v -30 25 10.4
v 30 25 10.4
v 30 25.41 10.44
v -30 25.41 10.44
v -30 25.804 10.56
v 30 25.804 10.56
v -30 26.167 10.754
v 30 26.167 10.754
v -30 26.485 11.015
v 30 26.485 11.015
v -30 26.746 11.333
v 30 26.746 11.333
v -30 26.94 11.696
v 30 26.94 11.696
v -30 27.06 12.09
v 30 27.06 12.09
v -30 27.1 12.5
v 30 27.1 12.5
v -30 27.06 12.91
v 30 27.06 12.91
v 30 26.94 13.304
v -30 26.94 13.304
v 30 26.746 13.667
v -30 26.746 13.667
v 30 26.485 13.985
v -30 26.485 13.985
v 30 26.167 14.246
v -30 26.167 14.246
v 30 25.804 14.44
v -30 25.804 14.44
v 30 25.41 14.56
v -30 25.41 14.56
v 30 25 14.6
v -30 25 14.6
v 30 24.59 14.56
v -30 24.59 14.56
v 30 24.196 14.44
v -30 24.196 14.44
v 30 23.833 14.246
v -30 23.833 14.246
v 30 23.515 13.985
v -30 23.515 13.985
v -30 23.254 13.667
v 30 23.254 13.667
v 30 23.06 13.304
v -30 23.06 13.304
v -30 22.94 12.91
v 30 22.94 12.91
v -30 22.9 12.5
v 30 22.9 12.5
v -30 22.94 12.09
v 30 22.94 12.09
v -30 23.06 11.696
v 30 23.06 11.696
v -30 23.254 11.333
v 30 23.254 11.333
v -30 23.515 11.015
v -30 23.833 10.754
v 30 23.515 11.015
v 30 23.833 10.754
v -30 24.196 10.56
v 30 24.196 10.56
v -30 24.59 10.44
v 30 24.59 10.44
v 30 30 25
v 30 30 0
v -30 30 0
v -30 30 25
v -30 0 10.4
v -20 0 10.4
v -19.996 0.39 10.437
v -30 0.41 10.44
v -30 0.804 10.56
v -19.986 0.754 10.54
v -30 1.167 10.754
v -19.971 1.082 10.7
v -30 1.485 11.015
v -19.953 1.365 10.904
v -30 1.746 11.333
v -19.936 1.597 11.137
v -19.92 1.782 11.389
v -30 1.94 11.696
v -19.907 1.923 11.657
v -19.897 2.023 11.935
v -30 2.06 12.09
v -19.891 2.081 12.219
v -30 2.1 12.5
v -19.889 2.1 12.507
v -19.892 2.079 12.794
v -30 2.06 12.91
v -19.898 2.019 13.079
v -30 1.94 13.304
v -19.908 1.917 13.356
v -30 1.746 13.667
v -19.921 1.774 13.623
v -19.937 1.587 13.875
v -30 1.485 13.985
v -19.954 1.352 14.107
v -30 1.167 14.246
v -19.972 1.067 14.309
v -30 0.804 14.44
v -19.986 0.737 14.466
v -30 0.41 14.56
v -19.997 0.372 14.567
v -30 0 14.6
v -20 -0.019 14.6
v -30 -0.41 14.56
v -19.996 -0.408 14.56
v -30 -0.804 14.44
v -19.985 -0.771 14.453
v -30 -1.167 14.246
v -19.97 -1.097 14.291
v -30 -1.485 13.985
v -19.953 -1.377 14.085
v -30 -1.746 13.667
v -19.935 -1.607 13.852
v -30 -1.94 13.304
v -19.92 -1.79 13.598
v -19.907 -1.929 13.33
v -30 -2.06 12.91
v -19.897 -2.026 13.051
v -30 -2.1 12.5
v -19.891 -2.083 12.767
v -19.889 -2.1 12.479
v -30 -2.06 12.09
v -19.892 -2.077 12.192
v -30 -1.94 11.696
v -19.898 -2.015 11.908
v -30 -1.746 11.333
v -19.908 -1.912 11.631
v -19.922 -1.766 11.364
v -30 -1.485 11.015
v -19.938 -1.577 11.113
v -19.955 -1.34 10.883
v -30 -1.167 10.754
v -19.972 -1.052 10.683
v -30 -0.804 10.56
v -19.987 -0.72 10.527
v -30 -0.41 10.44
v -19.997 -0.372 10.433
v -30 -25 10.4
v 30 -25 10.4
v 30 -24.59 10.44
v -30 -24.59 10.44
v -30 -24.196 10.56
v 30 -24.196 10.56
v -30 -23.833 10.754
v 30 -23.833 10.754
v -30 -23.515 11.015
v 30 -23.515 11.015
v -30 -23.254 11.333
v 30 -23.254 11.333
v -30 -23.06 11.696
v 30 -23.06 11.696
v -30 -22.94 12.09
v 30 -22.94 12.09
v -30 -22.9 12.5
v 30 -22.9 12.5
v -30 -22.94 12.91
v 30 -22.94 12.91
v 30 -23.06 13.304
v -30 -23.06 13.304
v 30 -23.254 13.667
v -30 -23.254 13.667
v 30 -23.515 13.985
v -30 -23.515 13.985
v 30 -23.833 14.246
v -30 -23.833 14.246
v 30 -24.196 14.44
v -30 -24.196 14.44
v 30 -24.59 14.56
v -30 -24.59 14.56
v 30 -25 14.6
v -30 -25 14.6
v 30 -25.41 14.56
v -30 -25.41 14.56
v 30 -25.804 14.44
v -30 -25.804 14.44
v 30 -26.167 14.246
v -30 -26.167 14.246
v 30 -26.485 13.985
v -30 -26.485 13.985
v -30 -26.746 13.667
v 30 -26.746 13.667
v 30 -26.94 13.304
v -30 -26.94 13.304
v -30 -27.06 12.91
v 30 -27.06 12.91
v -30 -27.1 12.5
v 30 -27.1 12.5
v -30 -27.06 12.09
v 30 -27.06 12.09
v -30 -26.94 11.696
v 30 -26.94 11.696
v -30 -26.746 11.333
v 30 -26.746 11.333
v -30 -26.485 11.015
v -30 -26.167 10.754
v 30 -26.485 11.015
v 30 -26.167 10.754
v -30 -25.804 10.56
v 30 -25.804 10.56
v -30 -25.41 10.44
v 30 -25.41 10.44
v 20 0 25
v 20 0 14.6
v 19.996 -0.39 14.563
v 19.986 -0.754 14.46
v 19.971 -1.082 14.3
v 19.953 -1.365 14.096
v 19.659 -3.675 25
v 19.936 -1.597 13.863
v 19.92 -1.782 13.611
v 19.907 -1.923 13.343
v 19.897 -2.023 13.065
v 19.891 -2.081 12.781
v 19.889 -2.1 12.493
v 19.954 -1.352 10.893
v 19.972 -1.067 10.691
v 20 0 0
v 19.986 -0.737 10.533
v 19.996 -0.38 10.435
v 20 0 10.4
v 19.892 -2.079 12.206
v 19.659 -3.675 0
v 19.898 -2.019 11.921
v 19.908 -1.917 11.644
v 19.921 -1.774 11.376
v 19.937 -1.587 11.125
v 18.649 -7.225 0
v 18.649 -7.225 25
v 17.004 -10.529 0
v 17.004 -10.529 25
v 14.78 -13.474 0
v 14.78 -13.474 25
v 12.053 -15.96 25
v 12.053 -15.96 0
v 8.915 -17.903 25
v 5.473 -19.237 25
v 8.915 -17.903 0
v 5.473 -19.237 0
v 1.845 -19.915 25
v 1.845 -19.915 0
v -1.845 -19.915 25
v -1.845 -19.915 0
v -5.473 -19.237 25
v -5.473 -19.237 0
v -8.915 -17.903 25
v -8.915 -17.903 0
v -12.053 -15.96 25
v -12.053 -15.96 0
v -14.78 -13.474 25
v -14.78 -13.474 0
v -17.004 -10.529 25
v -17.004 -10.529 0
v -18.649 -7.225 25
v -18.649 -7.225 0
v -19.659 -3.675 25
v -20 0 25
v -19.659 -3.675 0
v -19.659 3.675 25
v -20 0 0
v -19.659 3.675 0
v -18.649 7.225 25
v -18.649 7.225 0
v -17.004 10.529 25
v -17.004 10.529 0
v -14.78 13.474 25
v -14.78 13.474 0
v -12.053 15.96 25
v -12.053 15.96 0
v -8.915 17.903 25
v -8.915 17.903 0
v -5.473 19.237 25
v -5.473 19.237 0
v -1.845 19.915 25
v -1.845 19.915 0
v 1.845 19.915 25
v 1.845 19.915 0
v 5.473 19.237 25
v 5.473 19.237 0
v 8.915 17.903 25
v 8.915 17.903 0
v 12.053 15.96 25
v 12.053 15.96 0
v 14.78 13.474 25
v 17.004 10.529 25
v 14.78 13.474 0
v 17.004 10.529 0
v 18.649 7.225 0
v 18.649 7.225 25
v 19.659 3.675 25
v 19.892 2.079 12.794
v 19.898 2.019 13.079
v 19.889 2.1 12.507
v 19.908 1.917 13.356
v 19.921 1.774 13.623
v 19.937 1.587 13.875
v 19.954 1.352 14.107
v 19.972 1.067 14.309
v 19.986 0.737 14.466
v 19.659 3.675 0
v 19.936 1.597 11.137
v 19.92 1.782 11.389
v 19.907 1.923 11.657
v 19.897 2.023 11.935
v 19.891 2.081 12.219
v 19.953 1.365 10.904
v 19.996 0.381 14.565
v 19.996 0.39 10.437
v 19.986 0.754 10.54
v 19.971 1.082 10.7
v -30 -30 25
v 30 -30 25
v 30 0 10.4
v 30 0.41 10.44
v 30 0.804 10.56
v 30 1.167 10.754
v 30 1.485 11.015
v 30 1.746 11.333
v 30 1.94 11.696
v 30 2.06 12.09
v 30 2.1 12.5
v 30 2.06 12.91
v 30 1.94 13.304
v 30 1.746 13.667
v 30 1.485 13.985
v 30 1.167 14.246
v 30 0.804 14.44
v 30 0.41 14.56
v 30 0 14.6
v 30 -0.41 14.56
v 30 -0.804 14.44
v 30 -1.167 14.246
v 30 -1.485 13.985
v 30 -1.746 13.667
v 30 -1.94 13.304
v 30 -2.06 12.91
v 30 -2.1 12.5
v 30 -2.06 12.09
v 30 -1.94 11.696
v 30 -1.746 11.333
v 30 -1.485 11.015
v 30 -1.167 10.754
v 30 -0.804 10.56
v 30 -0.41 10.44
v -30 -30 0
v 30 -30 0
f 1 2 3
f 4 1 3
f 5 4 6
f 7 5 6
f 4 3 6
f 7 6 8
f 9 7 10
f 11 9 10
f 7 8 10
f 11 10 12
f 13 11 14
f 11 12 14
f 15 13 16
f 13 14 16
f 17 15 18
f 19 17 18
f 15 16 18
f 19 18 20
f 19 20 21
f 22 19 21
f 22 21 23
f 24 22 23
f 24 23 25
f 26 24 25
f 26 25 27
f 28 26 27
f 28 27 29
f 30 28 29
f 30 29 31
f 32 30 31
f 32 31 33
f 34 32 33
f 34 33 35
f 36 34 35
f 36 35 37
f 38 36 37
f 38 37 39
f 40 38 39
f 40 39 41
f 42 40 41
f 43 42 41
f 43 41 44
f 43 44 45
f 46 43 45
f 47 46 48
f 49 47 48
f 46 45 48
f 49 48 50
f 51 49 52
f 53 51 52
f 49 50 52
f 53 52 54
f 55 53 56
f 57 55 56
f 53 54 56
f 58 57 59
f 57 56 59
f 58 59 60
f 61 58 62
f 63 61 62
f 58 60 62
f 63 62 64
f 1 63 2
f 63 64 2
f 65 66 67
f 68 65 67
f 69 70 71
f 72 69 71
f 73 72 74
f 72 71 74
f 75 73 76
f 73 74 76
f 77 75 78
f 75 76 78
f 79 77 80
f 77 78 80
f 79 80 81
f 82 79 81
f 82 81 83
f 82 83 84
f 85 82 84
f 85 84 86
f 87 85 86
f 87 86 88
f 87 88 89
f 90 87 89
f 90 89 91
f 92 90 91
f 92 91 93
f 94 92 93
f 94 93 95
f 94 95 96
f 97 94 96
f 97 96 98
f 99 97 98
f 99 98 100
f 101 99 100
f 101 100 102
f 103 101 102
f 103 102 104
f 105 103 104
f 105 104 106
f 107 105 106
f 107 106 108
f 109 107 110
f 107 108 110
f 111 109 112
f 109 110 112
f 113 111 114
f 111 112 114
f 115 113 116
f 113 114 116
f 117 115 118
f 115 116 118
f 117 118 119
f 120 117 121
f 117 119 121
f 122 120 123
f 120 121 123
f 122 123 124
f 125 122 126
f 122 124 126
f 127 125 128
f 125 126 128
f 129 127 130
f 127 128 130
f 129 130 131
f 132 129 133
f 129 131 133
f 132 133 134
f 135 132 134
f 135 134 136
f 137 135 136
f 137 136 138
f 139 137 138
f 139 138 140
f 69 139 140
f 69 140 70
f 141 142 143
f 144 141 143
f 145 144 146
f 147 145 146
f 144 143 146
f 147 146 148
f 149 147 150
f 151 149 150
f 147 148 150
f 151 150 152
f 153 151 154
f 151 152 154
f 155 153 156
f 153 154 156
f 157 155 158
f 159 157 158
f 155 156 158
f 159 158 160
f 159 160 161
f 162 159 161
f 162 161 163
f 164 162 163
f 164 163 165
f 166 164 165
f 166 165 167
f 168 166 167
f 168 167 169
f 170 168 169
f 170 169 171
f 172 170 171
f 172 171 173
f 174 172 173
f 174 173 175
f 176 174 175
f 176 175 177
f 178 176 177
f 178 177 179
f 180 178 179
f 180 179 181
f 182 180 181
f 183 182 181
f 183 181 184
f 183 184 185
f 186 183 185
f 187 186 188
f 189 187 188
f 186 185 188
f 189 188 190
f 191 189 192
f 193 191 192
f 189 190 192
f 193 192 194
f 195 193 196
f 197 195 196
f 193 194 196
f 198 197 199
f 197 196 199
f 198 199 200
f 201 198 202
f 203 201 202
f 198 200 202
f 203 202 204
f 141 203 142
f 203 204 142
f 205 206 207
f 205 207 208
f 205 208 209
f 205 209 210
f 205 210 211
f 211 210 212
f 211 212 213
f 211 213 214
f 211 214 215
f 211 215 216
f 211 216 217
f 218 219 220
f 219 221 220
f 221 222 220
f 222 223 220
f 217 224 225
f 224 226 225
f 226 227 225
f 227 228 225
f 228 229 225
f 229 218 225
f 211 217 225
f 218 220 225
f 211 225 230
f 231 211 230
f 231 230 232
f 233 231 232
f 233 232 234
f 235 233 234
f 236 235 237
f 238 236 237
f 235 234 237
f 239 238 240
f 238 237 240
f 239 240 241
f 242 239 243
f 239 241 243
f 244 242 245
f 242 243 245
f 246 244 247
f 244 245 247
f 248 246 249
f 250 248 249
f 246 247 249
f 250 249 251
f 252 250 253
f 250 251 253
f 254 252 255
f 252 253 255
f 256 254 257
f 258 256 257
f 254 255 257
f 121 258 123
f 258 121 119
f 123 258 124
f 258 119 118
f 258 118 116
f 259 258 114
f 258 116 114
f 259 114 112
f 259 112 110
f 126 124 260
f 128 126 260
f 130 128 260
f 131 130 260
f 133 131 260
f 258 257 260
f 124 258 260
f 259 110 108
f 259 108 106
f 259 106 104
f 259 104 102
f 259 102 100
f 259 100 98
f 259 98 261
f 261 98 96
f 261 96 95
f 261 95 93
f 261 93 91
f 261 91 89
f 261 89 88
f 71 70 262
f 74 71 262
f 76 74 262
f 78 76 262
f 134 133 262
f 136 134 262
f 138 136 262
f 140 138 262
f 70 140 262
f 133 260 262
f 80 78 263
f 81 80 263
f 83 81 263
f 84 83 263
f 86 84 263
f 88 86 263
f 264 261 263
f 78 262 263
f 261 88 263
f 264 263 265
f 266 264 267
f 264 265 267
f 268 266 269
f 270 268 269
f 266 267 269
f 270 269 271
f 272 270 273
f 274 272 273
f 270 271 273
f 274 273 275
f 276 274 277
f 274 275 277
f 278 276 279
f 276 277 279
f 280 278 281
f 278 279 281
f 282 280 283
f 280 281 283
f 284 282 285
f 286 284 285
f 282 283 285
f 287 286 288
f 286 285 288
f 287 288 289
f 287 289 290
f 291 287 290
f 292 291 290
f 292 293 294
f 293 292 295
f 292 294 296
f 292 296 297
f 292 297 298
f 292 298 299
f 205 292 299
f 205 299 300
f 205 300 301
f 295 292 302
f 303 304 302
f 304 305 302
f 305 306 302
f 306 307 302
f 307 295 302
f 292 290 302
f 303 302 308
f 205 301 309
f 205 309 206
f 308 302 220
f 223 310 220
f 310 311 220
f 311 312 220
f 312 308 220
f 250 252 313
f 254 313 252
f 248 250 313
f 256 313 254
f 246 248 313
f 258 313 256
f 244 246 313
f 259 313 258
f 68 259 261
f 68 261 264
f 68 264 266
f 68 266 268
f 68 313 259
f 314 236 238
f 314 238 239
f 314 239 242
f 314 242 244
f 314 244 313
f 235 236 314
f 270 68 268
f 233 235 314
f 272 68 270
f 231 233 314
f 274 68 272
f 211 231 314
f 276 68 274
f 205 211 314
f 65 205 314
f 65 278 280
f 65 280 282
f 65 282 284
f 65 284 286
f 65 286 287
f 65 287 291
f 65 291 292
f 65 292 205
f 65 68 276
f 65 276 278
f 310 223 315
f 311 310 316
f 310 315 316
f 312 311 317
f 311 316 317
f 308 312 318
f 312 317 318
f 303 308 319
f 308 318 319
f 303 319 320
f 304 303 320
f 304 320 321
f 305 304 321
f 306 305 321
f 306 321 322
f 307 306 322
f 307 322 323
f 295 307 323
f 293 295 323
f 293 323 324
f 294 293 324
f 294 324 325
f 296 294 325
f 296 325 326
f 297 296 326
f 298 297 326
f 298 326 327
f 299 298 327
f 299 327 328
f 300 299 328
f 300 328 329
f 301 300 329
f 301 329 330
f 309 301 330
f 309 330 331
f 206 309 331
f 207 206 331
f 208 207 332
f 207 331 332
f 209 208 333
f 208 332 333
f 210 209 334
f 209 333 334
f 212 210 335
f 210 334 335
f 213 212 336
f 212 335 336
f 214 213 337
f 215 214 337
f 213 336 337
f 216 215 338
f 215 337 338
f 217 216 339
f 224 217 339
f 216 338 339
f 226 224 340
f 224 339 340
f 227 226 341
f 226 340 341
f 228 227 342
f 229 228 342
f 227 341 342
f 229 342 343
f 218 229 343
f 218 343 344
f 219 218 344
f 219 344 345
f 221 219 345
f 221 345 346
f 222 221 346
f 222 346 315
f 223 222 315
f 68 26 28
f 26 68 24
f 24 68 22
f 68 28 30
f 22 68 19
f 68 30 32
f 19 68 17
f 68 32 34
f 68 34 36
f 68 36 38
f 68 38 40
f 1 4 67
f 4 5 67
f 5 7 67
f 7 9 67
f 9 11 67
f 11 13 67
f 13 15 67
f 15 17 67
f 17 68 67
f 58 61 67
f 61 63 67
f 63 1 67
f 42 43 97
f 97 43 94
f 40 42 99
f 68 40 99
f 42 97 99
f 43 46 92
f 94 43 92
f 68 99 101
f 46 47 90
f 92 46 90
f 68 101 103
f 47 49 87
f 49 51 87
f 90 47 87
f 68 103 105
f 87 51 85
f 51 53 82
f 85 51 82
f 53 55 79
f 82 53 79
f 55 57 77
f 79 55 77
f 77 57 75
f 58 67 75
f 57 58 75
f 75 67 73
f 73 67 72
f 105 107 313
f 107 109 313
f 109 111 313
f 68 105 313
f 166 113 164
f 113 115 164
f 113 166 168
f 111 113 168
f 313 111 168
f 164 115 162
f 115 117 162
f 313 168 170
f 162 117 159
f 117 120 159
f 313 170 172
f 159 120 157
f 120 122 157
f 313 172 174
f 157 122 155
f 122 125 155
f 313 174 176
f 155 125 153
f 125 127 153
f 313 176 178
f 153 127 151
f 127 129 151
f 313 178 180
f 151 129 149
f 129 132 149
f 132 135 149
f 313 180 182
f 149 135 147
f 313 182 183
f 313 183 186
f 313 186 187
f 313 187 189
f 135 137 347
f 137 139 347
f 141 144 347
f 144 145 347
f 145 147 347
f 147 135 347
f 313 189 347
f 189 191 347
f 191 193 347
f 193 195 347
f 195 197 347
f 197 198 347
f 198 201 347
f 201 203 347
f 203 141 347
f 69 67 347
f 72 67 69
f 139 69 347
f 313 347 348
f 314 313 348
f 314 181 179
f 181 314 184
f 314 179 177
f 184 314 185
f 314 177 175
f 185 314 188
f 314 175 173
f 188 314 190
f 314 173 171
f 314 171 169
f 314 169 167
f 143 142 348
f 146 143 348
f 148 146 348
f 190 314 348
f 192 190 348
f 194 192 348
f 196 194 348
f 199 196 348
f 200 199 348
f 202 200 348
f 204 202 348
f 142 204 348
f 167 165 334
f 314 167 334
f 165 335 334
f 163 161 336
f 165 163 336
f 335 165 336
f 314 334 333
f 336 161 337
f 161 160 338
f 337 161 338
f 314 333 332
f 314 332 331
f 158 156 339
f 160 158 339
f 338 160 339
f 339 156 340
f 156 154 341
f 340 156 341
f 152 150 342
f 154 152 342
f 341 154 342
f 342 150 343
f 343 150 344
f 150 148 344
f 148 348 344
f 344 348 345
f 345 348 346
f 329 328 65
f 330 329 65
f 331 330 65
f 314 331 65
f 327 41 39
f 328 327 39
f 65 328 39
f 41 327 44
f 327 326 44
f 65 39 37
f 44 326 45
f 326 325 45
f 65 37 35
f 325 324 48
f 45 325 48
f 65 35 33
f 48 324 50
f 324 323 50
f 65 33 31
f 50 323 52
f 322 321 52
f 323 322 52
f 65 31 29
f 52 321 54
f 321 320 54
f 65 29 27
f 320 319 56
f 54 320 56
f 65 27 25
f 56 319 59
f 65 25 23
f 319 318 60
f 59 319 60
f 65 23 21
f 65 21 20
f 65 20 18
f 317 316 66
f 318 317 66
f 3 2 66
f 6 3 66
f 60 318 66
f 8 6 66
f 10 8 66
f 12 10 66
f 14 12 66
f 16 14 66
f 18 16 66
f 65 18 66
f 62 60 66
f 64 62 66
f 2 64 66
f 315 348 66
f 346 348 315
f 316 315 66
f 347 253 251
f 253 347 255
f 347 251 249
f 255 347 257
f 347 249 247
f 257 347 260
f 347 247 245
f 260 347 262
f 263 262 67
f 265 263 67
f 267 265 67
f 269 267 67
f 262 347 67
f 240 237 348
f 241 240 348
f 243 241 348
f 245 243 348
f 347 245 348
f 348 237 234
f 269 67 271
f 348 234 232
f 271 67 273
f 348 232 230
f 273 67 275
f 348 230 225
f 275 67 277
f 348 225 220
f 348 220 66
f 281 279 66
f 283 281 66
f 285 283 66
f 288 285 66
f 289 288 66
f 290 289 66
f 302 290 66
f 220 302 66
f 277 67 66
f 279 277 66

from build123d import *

# Parameters (mm, degrees)
BOSS_EXTRUDE1_DEPTH = 25
SKETCH2_R           = 2.1
CUT_EXTRUDE1_DEPTH  = 72.589105316


with BuildPart() as part:
    # Sketch1 → Boss-Extrude1 (new body)
    with BuildSketch(Plane.XY):
        with BuildLine():
            Line((-30, 0), (-20, 0))
            ThreePointArc((-20, 0), (0, 20), (20, 0))
            Line((20, 0), (30, 0))
            Line((30, 0), (30, 30))
            Line((30, 30), (-30, 30))
            Line((-30, 30), (-30, 0))
        make_face()
        with BuildLine():
            ThreePointArc((20, 0), (0, -20), (-20, 0))
            Line((-20, 0), (-30, 0))
            Line((-30, 0), (-30, -30))
            Line((-30, -30), (30, -30))
            Line((30, -30), (30, 0))
            Line((30, 0), (20, 0))
        make_face()
    extrude(amount=BOSS_EXTRUDE1_DEPTH)

    # Sketch2 → Cut-Extrude1 (cut, through all)
    with BuildSketch(Plane(origin=(30, 0, 0), x_dir=(0, 0, -1), z_dir=(1, 0, 0))):
        with Locations((-12.5, 25)):
            Circle(SKETCH2_R)
        with Locations((-12.5, -25)):
            Circle(SKETCH2_R)
        with Locations((-12.5, 0)):
            Circle(SKETCH2_R)
    extrude(amount=-CUT_EXTRUDE1_DEPTH, mode=Mode.SUBTRACT)


solid = part.part
